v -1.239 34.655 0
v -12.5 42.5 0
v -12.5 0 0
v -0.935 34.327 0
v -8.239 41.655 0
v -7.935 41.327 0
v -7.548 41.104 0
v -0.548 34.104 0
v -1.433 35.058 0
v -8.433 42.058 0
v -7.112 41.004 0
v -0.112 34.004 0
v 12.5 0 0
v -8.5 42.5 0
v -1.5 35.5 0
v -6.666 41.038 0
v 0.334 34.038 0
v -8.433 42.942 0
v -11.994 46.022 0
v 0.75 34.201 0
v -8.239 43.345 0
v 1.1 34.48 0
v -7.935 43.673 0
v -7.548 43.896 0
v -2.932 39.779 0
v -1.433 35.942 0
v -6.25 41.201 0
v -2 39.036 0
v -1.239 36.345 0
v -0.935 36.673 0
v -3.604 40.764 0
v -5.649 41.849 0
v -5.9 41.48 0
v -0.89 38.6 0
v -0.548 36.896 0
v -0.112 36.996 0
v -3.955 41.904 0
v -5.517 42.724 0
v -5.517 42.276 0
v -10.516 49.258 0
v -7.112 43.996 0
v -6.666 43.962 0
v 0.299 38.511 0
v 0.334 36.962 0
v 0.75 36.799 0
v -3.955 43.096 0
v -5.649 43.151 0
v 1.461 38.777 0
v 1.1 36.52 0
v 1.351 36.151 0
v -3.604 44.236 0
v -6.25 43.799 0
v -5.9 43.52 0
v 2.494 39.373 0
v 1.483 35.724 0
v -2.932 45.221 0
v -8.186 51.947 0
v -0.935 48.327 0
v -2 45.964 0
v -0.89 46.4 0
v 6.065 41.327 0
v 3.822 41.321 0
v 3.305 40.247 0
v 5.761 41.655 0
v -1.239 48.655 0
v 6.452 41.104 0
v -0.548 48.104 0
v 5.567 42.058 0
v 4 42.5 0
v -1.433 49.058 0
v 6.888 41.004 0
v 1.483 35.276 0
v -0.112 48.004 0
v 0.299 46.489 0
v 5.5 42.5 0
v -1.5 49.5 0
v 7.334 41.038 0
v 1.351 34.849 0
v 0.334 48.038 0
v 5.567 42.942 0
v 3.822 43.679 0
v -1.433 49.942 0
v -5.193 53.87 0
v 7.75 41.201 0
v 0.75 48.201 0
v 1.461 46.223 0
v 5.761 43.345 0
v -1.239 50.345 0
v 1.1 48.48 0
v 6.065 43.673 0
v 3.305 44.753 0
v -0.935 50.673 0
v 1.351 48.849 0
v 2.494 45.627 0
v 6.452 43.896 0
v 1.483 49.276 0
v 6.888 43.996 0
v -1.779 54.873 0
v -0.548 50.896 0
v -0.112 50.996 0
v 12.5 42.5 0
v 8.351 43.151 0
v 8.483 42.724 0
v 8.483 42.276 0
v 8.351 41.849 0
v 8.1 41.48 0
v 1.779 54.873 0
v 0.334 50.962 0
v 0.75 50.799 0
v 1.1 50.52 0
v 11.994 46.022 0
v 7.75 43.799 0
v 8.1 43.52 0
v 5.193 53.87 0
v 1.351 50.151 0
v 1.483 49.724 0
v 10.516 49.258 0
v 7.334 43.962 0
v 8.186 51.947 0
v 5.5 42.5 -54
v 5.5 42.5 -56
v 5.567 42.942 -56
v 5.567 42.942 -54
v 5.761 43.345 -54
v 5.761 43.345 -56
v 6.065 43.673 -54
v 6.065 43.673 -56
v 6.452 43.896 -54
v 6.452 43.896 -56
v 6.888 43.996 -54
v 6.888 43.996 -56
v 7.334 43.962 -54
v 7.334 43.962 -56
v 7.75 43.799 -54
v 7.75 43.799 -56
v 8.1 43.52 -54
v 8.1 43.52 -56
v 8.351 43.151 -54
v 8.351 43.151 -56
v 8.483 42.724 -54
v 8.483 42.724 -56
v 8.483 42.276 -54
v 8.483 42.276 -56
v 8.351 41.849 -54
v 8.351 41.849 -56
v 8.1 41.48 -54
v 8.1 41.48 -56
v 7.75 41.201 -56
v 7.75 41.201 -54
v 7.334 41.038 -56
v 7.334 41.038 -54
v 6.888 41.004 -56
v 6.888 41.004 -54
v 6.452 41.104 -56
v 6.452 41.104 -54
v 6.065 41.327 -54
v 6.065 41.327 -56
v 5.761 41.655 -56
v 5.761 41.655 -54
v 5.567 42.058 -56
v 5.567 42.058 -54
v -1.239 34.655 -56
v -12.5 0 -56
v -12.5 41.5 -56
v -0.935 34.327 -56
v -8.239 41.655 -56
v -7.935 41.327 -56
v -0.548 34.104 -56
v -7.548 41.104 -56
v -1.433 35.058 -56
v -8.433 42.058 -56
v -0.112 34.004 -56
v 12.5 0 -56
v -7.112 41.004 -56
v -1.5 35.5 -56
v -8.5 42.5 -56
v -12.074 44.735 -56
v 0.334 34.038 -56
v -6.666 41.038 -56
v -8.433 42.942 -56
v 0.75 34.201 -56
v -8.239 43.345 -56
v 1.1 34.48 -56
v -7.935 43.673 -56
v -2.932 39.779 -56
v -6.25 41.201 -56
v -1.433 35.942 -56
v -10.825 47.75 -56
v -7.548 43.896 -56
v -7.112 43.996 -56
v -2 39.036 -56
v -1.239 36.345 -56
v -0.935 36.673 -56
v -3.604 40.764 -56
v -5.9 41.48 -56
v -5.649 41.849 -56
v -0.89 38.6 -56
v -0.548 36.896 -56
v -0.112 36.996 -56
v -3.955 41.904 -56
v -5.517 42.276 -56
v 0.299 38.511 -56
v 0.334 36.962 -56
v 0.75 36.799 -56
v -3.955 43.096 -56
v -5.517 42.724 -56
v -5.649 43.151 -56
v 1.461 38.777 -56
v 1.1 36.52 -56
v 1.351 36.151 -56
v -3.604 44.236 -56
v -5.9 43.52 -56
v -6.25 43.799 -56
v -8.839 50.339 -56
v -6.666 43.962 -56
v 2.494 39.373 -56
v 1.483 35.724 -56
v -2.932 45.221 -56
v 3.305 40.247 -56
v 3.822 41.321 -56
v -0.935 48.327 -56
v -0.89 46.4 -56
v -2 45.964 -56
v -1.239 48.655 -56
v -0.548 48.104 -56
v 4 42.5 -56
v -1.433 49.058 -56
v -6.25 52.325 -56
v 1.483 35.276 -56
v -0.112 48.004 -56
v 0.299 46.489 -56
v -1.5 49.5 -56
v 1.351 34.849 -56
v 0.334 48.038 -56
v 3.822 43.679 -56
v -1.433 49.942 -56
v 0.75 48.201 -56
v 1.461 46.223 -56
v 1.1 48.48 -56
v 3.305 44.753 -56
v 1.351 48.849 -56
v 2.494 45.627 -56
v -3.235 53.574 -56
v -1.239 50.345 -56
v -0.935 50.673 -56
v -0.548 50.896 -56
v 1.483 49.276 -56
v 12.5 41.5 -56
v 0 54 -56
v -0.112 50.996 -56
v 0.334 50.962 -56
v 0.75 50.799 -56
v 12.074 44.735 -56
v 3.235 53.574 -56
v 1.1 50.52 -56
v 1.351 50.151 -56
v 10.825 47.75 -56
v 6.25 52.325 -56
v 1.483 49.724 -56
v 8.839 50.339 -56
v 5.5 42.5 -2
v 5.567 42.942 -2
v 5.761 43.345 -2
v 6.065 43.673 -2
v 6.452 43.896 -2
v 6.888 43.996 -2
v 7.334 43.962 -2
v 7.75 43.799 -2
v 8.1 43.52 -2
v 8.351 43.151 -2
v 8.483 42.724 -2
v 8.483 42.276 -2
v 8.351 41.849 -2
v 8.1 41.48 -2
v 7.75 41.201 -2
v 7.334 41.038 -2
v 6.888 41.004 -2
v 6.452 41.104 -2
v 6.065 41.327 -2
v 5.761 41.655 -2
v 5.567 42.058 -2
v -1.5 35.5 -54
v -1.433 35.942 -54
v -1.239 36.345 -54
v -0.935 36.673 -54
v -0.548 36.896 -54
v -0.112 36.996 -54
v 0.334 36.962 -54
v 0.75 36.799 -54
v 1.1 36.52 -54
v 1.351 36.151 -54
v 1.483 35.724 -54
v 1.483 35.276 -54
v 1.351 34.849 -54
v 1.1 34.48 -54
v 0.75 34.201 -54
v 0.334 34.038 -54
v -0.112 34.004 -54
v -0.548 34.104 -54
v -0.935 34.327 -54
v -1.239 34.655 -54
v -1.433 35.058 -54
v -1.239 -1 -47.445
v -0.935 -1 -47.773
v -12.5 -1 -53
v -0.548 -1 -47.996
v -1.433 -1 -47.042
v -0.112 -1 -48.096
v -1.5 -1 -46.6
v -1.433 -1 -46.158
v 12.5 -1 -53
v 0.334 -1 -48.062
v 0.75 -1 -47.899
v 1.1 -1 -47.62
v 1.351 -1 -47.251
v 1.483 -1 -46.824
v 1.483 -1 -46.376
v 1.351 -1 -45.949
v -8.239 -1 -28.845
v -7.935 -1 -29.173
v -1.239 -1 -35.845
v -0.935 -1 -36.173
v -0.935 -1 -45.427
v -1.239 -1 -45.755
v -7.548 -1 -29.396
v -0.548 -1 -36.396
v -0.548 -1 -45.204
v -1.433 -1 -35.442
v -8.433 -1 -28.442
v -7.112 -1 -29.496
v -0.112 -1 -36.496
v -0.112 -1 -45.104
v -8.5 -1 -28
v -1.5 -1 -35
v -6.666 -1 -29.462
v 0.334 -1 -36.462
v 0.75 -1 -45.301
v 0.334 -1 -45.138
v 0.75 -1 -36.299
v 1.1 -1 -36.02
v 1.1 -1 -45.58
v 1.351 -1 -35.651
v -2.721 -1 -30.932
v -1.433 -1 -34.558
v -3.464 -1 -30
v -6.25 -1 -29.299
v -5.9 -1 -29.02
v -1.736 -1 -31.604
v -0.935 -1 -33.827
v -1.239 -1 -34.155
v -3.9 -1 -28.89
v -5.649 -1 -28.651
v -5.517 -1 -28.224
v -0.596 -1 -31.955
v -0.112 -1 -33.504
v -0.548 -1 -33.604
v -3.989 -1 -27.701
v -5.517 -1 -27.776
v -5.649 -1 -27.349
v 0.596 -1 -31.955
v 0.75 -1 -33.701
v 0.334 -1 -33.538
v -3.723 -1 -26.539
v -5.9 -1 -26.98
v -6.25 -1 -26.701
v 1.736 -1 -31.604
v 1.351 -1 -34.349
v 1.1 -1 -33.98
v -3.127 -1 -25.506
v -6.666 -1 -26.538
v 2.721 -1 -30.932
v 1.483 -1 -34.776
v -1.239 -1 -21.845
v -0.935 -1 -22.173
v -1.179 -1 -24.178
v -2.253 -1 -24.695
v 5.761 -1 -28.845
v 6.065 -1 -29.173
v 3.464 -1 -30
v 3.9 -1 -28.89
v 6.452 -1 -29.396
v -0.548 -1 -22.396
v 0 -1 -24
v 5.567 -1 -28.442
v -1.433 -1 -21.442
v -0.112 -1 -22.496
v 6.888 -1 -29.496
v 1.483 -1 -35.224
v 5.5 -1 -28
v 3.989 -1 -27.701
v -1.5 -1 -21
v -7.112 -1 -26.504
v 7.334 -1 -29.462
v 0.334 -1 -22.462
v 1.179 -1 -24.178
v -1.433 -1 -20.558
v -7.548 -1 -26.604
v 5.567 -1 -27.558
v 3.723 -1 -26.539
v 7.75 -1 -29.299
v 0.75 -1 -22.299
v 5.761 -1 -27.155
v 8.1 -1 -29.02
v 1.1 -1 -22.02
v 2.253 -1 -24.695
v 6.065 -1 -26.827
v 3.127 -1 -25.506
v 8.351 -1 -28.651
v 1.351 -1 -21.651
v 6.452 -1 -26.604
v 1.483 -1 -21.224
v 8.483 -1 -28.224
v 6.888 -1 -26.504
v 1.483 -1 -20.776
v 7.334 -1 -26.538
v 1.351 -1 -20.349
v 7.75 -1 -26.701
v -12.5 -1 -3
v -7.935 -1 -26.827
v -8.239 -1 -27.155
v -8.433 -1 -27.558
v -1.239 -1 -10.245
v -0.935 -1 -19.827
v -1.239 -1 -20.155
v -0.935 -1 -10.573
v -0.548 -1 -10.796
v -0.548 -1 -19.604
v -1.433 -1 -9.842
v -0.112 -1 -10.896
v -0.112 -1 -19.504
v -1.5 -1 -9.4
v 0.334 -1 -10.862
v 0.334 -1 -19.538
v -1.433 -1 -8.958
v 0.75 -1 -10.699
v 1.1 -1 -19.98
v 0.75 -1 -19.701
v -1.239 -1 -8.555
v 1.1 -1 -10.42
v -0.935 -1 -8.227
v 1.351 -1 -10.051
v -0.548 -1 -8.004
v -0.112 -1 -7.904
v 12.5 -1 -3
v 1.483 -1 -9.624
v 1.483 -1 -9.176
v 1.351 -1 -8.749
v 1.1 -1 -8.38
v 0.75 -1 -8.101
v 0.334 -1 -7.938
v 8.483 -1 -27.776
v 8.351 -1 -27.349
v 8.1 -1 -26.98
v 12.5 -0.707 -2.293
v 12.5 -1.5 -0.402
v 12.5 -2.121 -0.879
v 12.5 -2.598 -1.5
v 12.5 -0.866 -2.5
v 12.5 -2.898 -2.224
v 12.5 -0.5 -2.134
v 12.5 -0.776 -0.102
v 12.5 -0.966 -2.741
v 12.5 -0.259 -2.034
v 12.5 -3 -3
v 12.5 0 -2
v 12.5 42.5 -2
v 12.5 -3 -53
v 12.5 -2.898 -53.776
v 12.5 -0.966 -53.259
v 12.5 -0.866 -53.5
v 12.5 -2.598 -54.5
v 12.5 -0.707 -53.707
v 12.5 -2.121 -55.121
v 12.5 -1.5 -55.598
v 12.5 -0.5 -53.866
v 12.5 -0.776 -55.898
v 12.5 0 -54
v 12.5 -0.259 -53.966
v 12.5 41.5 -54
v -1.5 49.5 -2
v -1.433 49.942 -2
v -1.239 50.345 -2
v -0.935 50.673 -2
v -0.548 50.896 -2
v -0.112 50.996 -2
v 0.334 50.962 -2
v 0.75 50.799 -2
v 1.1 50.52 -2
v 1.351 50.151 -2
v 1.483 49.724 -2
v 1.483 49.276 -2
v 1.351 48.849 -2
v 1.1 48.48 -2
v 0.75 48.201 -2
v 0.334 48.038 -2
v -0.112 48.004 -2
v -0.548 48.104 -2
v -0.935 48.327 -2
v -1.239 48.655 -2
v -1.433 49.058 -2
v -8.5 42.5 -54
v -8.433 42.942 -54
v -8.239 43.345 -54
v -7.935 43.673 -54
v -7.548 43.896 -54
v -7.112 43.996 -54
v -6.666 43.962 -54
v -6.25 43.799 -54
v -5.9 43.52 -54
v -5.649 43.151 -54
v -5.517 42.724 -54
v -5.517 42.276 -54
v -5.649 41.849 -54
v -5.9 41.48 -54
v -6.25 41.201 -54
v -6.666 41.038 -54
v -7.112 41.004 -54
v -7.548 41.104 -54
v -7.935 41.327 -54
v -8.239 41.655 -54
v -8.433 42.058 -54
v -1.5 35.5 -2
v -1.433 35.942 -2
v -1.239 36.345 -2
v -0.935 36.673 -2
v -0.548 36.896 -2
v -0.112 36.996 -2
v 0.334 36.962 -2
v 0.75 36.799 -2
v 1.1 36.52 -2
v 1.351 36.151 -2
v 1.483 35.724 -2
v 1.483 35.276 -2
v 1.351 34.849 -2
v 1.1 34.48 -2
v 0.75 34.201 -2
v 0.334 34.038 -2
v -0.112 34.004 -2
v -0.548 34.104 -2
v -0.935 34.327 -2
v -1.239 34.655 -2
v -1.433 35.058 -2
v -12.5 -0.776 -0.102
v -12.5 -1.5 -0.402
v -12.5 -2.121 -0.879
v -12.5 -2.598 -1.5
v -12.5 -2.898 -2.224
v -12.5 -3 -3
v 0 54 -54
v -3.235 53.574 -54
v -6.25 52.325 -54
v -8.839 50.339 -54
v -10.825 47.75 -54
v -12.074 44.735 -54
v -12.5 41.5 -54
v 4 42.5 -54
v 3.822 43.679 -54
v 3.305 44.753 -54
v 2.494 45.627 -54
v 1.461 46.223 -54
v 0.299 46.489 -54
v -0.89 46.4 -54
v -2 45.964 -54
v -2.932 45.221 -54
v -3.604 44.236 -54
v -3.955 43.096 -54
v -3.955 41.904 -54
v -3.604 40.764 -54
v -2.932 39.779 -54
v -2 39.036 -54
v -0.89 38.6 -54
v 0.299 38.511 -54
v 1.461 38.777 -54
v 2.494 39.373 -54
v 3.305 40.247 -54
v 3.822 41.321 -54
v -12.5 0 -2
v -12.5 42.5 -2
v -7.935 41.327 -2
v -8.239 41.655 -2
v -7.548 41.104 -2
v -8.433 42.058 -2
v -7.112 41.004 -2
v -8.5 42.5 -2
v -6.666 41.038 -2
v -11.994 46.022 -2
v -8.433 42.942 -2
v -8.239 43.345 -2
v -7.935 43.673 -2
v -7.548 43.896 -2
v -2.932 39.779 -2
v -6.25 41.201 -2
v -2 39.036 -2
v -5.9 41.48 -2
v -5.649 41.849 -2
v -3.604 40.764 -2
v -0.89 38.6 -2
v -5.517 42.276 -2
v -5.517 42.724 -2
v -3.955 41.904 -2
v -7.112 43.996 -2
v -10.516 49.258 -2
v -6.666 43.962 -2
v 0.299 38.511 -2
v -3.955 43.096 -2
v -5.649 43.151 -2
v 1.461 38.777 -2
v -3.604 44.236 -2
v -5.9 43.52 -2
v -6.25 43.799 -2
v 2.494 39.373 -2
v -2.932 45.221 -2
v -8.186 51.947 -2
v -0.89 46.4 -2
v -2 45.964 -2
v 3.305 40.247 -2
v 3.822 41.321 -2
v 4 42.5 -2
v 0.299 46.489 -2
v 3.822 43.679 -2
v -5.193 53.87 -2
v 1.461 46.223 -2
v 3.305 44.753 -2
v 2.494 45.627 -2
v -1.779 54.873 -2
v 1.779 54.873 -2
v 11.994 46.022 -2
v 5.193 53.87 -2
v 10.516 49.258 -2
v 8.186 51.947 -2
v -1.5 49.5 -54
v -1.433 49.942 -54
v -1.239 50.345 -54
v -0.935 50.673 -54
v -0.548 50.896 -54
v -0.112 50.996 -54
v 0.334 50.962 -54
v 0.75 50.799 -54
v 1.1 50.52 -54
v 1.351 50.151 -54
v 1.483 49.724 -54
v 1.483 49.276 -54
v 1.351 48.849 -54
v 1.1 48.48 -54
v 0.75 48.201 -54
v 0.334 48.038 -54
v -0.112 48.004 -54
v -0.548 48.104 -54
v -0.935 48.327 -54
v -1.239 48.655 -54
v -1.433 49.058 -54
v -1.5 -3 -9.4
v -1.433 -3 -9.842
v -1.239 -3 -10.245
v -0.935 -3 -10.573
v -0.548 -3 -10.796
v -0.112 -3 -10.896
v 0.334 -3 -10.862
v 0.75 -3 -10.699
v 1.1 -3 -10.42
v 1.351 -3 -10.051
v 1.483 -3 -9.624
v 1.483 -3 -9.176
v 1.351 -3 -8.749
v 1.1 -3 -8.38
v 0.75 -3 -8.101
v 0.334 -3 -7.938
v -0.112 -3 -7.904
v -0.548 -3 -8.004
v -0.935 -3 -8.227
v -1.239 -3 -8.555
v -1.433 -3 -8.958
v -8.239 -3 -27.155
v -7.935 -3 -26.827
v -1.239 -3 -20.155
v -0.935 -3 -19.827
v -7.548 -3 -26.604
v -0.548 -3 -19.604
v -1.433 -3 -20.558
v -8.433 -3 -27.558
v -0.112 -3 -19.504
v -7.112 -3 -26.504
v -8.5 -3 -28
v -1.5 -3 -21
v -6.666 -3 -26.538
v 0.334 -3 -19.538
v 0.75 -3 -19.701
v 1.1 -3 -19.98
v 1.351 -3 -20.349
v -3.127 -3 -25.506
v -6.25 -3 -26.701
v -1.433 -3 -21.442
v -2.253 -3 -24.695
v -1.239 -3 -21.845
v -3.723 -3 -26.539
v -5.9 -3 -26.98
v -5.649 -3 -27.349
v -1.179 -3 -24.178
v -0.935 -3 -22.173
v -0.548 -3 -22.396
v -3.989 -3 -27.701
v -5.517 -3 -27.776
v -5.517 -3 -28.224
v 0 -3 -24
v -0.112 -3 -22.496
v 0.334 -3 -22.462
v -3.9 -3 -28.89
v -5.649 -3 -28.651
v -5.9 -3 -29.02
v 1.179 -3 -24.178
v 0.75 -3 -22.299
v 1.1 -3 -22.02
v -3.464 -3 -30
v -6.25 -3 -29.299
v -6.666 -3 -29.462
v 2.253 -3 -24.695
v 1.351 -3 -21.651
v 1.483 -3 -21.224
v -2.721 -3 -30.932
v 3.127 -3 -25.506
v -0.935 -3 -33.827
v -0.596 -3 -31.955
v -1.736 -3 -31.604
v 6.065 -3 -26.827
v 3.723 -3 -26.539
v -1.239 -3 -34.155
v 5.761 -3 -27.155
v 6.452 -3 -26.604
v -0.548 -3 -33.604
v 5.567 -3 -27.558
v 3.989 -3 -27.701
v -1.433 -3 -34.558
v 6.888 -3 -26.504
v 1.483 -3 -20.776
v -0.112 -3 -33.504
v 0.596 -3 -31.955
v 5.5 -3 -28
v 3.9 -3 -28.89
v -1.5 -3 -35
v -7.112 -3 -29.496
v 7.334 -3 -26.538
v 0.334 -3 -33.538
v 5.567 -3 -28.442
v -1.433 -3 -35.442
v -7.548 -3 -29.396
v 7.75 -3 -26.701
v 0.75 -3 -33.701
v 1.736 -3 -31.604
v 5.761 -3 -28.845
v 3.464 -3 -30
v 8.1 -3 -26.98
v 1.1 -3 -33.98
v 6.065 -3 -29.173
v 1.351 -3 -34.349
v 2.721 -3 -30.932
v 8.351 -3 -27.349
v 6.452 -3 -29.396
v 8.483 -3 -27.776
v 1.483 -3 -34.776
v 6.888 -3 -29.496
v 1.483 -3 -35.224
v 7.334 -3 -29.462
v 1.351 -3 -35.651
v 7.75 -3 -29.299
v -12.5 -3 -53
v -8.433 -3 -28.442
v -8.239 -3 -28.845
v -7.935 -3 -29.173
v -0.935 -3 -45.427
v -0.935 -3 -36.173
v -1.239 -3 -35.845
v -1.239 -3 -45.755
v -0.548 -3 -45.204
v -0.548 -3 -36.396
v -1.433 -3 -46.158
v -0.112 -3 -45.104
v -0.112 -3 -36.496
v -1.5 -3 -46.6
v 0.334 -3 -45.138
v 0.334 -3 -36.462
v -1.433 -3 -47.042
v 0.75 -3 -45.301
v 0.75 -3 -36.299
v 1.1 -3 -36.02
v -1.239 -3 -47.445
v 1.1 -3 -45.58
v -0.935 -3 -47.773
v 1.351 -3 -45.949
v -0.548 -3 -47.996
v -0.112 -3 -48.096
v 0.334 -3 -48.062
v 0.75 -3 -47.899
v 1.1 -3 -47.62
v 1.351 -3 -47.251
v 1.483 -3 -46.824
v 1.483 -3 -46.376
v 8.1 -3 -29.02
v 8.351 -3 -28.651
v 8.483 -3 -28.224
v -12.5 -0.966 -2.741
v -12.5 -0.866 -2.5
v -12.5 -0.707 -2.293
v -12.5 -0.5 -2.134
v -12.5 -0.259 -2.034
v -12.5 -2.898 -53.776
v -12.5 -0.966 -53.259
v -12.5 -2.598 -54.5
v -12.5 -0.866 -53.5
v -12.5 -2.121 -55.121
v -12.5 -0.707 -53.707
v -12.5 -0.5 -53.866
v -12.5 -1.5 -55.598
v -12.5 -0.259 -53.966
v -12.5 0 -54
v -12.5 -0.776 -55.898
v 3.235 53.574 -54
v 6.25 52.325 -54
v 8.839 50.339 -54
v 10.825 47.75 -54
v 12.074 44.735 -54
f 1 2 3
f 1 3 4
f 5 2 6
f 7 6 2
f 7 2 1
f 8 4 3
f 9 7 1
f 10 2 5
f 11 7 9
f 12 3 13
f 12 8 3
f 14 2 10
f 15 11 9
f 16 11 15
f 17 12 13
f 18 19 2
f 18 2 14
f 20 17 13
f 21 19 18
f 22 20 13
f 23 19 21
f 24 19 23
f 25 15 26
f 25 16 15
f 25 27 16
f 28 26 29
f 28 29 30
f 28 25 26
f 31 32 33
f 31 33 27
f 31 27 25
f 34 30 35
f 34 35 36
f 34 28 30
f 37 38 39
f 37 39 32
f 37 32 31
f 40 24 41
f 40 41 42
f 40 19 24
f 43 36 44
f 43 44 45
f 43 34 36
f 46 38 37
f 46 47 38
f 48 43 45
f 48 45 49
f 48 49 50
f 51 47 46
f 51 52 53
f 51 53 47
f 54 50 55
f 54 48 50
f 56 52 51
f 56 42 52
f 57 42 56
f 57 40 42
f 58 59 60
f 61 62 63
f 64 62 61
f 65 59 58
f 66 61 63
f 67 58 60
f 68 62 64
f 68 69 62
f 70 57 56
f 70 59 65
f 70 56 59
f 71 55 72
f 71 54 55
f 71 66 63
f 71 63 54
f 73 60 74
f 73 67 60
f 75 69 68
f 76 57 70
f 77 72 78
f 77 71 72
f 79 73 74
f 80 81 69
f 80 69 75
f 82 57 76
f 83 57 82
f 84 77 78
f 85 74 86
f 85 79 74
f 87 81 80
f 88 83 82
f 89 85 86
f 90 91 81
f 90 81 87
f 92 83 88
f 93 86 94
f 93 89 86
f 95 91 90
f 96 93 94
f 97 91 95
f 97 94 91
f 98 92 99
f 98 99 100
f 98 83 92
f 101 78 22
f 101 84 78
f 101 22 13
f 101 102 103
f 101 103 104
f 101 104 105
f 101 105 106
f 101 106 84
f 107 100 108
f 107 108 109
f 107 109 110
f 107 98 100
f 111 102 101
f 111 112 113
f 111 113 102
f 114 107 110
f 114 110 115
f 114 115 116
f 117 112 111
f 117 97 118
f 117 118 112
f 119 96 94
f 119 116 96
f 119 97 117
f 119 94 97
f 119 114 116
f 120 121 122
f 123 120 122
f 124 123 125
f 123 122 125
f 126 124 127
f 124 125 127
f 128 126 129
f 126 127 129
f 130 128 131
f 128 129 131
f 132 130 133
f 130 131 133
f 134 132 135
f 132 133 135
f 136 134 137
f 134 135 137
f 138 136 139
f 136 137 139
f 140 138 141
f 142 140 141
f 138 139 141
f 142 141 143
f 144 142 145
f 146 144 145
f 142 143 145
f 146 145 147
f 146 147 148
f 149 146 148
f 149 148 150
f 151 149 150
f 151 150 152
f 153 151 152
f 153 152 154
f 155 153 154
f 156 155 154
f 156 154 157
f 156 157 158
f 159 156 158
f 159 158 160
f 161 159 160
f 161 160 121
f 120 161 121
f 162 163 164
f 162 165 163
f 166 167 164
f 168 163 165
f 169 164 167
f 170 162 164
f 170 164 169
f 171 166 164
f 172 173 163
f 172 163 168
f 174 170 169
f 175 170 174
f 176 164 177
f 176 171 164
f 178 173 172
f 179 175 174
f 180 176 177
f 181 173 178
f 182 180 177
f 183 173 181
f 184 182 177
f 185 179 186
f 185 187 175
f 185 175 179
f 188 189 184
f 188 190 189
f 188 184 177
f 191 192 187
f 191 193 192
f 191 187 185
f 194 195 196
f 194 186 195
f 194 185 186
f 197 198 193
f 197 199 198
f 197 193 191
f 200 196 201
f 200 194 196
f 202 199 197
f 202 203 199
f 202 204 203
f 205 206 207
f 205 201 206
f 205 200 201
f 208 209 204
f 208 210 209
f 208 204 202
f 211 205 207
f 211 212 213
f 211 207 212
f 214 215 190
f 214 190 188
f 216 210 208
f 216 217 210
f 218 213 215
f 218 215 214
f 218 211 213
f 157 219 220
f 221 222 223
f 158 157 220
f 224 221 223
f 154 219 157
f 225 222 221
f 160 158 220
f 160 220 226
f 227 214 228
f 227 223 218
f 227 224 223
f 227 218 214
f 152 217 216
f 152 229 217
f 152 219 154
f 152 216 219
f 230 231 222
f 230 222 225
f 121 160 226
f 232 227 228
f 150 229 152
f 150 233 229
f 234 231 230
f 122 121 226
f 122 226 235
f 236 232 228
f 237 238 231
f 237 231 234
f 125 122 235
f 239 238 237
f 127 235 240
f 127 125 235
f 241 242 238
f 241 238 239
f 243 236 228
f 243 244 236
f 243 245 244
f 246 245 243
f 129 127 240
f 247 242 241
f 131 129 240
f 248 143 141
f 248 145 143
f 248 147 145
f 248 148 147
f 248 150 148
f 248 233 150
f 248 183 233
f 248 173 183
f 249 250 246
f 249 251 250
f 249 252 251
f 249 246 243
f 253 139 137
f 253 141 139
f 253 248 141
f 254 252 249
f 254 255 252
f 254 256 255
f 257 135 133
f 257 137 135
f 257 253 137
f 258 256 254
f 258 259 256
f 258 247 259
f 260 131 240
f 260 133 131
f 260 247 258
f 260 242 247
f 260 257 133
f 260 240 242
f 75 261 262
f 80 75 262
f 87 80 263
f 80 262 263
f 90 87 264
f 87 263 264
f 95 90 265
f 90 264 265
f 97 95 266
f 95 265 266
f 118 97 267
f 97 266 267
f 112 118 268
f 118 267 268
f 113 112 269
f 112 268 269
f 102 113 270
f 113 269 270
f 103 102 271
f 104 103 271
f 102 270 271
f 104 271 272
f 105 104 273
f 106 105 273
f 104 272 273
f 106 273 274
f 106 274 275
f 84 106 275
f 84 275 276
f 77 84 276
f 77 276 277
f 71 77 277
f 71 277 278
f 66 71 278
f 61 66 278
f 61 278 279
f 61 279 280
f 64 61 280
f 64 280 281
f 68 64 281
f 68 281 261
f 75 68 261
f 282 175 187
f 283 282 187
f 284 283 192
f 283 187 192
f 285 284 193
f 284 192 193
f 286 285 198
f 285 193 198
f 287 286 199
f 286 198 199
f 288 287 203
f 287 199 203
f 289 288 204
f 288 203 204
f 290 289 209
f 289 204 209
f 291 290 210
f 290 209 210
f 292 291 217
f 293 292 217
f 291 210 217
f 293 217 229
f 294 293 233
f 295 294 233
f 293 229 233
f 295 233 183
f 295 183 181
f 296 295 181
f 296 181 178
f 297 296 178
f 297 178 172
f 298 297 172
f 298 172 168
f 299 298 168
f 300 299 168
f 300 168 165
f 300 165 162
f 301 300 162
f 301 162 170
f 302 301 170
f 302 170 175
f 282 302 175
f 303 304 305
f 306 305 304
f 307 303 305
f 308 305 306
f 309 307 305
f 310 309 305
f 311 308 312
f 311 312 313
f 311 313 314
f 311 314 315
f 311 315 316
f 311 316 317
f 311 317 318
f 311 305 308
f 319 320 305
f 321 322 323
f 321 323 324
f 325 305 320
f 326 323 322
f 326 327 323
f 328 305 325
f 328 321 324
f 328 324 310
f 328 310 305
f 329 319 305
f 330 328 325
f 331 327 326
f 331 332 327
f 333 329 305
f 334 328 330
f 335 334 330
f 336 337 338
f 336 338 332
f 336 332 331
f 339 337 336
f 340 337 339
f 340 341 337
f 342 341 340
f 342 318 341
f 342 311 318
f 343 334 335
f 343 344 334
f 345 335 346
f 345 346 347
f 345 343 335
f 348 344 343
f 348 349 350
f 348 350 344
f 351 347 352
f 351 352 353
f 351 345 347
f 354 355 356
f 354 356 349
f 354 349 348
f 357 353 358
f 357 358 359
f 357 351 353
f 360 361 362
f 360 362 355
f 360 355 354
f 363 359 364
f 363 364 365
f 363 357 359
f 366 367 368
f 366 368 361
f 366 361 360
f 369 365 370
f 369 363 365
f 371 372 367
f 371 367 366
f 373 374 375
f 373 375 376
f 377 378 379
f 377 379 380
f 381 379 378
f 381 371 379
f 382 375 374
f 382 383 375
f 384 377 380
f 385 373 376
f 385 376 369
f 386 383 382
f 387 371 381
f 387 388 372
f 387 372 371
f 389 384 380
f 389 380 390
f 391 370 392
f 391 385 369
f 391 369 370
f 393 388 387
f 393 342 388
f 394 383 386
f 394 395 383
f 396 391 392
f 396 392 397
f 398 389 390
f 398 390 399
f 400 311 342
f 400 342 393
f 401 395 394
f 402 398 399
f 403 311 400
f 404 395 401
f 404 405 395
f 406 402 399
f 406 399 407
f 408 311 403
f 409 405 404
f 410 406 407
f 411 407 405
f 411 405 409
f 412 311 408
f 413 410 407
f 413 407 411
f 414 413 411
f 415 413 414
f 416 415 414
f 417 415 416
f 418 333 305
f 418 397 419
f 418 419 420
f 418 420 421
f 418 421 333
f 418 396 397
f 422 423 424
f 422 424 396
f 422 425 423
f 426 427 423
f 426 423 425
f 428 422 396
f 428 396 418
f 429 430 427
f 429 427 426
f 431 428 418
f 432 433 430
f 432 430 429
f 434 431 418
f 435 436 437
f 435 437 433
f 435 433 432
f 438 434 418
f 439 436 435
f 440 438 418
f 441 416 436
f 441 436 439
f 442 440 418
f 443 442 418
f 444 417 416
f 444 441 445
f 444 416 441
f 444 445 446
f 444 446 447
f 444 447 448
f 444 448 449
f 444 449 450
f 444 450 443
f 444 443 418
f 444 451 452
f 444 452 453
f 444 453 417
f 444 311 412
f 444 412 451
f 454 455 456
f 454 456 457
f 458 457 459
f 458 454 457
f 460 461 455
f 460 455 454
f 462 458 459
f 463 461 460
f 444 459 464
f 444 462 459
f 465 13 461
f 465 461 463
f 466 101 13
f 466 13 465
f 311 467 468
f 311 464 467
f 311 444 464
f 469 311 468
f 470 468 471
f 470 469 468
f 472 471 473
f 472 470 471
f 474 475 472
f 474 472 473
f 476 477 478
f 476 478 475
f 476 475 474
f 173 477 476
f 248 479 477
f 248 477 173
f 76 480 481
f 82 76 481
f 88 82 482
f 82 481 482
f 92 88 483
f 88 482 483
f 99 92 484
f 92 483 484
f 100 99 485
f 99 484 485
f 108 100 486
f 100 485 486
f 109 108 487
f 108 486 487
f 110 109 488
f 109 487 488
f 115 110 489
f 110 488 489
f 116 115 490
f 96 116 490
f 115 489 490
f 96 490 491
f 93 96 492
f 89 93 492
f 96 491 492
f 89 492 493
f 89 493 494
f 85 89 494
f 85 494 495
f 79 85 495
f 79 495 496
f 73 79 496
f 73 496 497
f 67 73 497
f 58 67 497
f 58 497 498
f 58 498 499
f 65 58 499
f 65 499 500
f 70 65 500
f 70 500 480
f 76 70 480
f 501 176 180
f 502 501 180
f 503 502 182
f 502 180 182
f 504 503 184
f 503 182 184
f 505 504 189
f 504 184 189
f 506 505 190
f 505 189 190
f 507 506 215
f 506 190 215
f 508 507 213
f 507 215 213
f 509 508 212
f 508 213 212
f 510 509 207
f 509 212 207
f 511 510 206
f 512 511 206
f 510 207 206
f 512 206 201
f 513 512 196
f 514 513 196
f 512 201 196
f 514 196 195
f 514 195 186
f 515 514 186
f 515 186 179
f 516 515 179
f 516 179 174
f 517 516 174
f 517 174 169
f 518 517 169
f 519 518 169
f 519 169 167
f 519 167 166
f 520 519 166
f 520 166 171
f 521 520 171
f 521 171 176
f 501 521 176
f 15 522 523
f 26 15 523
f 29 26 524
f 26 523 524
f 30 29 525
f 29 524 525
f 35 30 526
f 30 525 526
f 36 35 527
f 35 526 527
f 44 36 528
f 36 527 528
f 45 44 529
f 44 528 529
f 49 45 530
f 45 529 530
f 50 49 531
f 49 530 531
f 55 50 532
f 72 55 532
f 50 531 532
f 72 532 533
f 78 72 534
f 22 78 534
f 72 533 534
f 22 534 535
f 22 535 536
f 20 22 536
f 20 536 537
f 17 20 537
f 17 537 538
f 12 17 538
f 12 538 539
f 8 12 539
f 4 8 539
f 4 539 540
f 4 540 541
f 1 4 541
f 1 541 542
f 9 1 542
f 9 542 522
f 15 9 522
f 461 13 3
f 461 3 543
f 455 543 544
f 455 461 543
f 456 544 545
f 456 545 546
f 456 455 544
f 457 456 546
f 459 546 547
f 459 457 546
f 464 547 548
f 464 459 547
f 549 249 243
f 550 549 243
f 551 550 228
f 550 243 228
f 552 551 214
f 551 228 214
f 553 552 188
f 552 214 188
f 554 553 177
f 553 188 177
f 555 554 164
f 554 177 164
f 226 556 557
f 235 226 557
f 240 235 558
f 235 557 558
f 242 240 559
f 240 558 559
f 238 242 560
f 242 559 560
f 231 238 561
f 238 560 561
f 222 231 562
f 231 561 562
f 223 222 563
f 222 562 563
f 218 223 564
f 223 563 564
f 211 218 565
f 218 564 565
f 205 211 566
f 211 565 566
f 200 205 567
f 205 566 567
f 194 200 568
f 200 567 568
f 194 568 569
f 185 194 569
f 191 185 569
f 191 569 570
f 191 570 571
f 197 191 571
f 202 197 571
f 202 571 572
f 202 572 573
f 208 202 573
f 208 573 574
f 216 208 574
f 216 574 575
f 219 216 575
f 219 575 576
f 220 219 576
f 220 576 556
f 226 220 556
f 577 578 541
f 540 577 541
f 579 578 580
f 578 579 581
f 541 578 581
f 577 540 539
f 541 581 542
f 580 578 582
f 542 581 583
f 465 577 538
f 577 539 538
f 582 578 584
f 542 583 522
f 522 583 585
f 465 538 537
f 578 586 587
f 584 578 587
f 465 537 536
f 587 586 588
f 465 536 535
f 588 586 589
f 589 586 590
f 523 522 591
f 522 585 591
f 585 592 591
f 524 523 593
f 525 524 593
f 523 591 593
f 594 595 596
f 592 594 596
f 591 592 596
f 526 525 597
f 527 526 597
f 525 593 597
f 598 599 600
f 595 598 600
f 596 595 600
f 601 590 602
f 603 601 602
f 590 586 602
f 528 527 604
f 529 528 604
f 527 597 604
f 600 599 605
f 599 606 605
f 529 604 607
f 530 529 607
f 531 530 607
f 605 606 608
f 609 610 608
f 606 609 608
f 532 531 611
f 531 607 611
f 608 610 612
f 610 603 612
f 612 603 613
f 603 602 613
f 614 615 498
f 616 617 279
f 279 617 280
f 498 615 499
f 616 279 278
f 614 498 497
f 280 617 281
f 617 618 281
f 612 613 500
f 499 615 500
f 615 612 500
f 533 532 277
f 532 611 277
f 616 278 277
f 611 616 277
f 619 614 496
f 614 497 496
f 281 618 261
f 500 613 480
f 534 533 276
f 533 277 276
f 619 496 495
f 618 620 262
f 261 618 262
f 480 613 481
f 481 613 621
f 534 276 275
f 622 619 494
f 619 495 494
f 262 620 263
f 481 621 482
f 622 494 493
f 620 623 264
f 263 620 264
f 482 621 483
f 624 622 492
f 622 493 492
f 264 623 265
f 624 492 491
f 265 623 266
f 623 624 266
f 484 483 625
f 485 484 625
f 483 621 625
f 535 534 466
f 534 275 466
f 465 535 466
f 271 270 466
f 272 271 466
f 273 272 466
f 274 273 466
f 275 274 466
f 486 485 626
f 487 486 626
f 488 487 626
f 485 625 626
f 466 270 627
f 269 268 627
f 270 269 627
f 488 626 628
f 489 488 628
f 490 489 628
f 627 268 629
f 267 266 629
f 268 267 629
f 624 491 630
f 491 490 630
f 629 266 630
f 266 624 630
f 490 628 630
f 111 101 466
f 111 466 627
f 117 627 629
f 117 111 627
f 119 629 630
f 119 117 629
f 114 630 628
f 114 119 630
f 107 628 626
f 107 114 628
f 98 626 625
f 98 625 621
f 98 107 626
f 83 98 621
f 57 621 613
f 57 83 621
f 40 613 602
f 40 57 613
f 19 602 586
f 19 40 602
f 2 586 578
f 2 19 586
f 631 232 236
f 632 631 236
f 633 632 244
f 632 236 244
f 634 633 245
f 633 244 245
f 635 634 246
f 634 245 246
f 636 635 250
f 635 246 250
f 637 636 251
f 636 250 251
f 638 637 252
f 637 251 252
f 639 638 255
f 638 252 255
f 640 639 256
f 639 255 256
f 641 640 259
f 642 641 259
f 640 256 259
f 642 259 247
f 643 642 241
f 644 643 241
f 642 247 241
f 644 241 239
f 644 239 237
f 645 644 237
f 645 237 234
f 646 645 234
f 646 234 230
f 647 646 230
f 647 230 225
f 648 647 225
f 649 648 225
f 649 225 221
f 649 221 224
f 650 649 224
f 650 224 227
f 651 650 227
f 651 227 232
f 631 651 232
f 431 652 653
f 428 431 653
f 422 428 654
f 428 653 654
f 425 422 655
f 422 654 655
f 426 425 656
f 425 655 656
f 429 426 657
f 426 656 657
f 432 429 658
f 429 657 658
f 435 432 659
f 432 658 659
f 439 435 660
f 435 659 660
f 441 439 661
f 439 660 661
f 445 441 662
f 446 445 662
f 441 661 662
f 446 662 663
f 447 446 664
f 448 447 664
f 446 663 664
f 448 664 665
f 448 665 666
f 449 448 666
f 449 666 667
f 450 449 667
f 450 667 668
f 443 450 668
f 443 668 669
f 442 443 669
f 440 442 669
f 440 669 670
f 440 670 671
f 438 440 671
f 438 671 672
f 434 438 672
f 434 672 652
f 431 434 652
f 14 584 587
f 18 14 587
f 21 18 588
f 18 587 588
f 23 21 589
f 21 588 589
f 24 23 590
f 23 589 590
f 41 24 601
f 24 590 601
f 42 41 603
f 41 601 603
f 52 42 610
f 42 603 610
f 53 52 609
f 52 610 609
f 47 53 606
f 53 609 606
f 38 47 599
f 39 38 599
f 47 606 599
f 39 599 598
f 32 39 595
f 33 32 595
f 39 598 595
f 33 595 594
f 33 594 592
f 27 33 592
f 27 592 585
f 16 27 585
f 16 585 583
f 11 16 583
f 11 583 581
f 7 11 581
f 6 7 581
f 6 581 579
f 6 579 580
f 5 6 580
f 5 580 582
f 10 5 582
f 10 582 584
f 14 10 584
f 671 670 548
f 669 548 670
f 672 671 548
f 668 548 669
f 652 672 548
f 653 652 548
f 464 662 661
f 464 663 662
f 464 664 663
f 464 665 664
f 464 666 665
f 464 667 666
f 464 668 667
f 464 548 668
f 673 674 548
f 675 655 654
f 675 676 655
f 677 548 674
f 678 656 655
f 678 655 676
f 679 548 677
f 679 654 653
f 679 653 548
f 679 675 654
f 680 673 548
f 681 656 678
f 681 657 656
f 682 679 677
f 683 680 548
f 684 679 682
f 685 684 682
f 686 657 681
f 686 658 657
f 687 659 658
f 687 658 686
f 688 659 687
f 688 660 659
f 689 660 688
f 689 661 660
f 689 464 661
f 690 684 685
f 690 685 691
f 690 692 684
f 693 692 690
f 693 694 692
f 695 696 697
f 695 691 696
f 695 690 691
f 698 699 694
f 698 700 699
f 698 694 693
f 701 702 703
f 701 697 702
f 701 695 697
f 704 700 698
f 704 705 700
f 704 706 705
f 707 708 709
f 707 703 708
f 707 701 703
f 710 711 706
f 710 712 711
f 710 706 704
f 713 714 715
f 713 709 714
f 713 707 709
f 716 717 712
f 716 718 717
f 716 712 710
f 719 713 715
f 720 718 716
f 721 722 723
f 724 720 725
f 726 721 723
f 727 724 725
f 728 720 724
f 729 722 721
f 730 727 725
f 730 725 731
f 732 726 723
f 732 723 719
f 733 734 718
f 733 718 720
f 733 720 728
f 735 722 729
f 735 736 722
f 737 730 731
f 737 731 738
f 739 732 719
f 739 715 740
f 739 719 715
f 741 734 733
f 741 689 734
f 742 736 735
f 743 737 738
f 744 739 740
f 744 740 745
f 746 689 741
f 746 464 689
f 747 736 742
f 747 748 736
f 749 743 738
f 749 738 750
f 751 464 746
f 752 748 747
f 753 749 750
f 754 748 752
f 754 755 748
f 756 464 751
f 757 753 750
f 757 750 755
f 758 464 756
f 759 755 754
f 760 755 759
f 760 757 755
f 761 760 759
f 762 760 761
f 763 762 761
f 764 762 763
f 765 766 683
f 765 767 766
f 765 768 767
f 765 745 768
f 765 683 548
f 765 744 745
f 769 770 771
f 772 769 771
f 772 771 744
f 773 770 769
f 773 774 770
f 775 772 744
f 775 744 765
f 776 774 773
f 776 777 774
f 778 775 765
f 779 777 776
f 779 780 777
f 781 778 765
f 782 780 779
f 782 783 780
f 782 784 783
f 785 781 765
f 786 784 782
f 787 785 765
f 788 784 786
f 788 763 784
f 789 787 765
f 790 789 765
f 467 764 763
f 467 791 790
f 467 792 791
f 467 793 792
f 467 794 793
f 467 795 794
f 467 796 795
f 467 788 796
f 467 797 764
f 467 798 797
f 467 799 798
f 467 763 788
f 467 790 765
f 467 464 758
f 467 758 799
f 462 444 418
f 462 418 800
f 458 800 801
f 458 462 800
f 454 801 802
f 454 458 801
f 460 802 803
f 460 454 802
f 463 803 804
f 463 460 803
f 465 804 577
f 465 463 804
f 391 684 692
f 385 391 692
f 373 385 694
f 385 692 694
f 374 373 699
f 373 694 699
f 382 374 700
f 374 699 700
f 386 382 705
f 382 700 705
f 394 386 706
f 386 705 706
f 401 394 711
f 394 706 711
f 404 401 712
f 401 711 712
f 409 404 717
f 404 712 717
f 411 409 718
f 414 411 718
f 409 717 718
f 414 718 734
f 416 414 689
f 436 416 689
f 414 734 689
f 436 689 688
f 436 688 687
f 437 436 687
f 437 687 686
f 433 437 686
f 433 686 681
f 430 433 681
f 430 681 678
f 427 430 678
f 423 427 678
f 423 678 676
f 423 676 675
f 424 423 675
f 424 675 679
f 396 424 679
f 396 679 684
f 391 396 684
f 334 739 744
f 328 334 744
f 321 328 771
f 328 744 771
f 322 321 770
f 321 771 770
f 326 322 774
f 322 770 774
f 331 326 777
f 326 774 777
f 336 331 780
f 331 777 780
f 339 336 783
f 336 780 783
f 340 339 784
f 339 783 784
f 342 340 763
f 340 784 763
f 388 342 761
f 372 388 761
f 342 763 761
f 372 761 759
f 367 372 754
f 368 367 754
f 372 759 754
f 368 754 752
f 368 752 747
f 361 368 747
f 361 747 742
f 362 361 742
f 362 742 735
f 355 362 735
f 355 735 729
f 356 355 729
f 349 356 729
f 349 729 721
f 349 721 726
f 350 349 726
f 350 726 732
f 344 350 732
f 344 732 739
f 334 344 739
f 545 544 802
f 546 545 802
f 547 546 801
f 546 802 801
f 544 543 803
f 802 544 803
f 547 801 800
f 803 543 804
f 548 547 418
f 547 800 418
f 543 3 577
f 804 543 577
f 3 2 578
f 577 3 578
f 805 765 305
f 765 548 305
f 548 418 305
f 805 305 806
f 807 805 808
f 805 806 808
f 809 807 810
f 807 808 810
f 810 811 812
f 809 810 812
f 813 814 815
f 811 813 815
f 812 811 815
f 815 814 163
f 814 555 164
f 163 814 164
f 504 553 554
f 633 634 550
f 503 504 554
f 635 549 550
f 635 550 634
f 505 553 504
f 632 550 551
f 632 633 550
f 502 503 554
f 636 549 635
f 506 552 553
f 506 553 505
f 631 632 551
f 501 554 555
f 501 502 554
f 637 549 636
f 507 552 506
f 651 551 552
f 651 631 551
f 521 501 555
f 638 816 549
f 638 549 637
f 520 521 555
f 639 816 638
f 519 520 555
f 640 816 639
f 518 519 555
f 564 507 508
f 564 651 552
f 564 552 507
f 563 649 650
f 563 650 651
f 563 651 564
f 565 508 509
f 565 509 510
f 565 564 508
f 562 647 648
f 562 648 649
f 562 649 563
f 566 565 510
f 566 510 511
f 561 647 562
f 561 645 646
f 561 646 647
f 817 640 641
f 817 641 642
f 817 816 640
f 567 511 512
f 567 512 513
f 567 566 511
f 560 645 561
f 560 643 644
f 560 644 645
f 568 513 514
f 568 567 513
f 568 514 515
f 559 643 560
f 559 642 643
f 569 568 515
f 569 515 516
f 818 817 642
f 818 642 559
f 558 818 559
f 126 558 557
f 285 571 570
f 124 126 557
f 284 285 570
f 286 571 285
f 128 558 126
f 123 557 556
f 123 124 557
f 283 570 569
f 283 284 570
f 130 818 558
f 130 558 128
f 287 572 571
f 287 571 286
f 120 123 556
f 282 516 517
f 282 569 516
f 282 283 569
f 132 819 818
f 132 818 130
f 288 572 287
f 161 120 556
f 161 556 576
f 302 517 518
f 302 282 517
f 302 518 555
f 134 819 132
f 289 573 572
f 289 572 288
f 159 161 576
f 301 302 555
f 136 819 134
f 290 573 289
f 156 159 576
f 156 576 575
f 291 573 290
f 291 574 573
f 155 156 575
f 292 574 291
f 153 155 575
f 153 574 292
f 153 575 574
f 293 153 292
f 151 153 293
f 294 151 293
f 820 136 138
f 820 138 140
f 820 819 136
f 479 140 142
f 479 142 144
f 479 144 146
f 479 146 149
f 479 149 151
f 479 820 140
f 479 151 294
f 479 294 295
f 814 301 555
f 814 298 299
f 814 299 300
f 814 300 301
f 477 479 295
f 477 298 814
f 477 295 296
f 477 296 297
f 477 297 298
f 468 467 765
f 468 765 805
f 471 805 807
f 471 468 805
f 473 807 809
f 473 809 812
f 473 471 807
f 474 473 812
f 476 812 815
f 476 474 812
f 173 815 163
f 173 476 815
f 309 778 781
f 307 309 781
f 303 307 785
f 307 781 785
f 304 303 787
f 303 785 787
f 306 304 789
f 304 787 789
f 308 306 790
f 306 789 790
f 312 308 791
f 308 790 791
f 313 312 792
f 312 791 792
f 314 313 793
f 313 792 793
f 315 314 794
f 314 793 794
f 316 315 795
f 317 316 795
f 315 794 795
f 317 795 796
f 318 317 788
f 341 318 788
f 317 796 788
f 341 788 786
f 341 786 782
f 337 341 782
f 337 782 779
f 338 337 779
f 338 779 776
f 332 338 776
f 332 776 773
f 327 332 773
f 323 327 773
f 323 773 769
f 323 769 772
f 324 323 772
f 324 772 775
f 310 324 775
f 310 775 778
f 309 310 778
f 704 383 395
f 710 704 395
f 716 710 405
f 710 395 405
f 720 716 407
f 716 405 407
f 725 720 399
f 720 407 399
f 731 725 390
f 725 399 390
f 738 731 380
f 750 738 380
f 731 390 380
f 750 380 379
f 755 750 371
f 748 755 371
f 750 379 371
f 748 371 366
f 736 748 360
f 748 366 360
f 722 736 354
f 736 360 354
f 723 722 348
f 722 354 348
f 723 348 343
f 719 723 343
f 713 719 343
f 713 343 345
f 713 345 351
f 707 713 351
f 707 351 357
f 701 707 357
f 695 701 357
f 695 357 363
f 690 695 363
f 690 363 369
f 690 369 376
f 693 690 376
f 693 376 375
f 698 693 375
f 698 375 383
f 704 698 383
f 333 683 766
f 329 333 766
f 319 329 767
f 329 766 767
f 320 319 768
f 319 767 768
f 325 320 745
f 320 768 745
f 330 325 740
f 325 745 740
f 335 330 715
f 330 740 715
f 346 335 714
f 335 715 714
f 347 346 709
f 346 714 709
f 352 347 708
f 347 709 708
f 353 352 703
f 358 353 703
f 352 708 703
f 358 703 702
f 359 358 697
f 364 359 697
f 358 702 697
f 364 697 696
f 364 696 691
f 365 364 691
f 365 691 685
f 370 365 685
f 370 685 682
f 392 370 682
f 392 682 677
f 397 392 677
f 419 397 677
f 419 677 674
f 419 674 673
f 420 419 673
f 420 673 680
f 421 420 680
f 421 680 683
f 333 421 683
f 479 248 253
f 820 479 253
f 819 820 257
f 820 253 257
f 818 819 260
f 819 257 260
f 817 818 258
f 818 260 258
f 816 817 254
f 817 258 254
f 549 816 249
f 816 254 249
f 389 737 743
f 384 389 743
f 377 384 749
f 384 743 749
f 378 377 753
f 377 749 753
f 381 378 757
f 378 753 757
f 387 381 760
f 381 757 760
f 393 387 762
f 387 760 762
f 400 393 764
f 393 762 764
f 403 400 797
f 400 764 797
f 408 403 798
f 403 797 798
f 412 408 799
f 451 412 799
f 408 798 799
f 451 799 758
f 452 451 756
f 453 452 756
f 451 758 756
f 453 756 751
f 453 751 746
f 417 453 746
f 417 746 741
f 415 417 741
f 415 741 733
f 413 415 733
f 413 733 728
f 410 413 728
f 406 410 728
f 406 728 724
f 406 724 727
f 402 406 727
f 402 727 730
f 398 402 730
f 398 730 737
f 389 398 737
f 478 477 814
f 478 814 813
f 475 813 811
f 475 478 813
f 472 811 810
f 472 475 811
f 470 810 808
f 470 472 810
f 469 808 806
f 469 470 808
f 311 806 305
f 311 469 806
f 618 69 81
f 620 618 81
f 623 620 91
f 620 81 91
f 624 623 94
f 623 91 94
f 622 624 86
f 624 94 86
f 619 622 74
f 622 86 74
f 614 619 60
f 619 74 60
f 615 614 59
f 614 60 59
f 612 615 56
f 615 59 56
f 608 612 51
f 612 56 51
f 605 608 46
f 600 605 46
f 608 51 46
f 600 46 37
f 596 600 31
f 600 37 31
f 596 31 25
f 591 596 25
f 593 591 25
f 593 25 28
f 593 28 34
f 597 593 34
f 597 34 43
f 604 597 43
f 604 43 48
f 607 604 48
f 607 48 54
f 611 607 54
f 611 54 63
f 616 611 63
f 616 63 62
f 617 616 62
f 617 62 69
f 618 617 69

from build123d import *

# Parameters (mm, degrees)
BASE_FLANGE1_DEPTH           = 2
EDGE_FLANGE1_DEPTH           = 25
EDGE_FLANGE2_STRIP_W         = 10
EDGE_FLANGE2_STRIP_H         = 2
EDGE_FLANGE2_STRIP_CUT_DEPTH = 25
EDGE_FLANGE2_DEPTH           = 25
CUT_EXTRUDE1_DEPTH           = 2
SKETCH19_R                   = 4
CUT_EXTRUDE2_DEPTH           = 80.481129836
M3X0_5_TAPPED_HOLE1_D        = 3
SKETCH22_R                   = 4
CUT_EXTRUDE3_DEPTH           = 81.176368089
M3X0_5_TAPPED_HOLE2_D        = 3


# Sheet-metal steps are written as plain solids
with BuildPart() as part:
    # Sketch8 → Base-Flange1 (new body)
    with BuildSketch(Plane.XY):
        with BuildLine():
            Line((-12.5, 0), (12.5, 0))
            Line((12.5, 0), (12.5, 42.5))
            ThreePointArc((12.5, 42.5), (0, 55), (-12.5, 42.5))
            Line((-12.5, 42.5), (-12.5, 0))
        make_face()
    extrude(amount=-BASE_FLANGE1_DEPTH)

    # Edge-Flange1 section (across the edge) → Edge-Flange1 (add)
    with BuildSketch(Plane(origin=(12.5, -1, -2), x_dir=(0, 1, 0), z_dir=(-1, 0, 0))):
        with BuildLine():
            Line((-2, 1), (-2, 52))
            Line((-2, 52), (0, 52))
            Line((0, 52), (0, 1))
            ThreePointArc((0, 1), (0.292893219, 0.292893219), (1, 0))
            Line((1, 0), (1, -2))
            ThreePointArc((1, -2), (-1.121320344, -1.121320344), (-2, 1))
        make_face()
    extrude(amount=EDGE_FLANGE1_DEPTH)

    # Edge-Flange2 strip (across the edge) → Edge-Flange2 strip cut (cut)
    with BuildSketch(Plane(origin=(12.5, -1, -54), x_dir=(0, 0, 1), z_dir=(-1, 0, 0))):
        with Locations((-4, -1)):
            Rectangle(EDGE_FLANGE2_STRIP_W, EDGE_FLANGE2_STRIP_H)
    extrude(amount=EDGE_FLANGE2_STRIP_CUT_DEPTH, mode=Mode.SUBTRACT)

    # Edge-Flange2 section (across the edge) → Edge-Flange2 (add)
    with BuildSketch(Plane(origin=(12.5, -1, -54), x_dir=(0, 0, 1), z_dir=(-1, 0, 0))):
        with BuildLine():
            Line((-2, 1), (-2, 55))
            Line((-2, 55), (0, 55))
            Line((0, 55), (0, 1))
            ThreePointArc((0, 1), (0.292893219, 0.292893219), (1, 0))
            Line((1, 0), (1, -2))
            ThreePointArc((1, -2), (-1.121320344, -1.121320344), (-2, 1))
        make_face()
    extrude(amount=EDGE_FLANGE2_DEPTH)

    # Sketch18 → Cut-Extrude1 (cut)
    with BuildSketch(Plane(origin=(0, 0, -56), x_dir=(-1, 0, 0), z_dir=(0, 0, -1))):
        with BuildLine():
            ThreePointArc((0, 54), (8.838834765, 50.338834765), (12.5, 41.5))
            Line((12.5, 41.5), (12.5, 54))
            Line((12.5, 54), (0, 54))
        make_face()
        with BuildLine():
            ThreePointArc((-12.5, 41.5), (-8.838834765, 50.338834765), (0, 54))
            Line((0, 54), (-12.5, 54))
            Line((-12.5, 54), (-12.5, 41.5))
        make_face()
    extrude(amount=-CUT_EXTRUDE1_DEPTH, mode=Mode.SUBTRACT)

    # Sketch19 → Cut-Extrude2 (cut, through all)
    with BuildSketch(Plane.XY):
        with Locations((0, 42.5)):
            Circle(SKETCH19_R)
    extrude(amount=-CUT_EXTRUDE2_DEPTH, mode=Mode.SUBTRACT)

    # M3x0.5 Tapped Hole1 (through all)
    with Locations(Plane.XY):
        with Locations((0, 49.5), (-7, 42.5), (0, 35.5), (7, 42.5)):
            Hole(M3X0_5_TAPPED_HOLE1_D / 2)

    # Sketch22 → Cut-Extrude3 (cut, through all)
    with BuildSketch(Plane(origin=(0, -1, 0), x_dir=(1, 0, 0), z_dir=(0, 1, 0))):
        with Locations(Location((0, 28, 0), (0, 0, 270))):
            Circle(SKETCH22_R)
    extrude(amount=-CUT_EXTRUDE3_DEPTH, mode=Mode.SUBTRACT)

    # M3x0.5 Tapped Hole2 (through all)
    with Locations(Plane(origin=(0, -1, 0), x_dir=(1, 0, 0), z_dir=(0, 1, 0))):
        with Locations((7, 28), (-7, 28), (0, 35), (0, 21), (0, 9.4), (0, 46.6)):
            Hole(M3X0_5_TAPPED_HOLE2_D / 2)


solid = part.part
